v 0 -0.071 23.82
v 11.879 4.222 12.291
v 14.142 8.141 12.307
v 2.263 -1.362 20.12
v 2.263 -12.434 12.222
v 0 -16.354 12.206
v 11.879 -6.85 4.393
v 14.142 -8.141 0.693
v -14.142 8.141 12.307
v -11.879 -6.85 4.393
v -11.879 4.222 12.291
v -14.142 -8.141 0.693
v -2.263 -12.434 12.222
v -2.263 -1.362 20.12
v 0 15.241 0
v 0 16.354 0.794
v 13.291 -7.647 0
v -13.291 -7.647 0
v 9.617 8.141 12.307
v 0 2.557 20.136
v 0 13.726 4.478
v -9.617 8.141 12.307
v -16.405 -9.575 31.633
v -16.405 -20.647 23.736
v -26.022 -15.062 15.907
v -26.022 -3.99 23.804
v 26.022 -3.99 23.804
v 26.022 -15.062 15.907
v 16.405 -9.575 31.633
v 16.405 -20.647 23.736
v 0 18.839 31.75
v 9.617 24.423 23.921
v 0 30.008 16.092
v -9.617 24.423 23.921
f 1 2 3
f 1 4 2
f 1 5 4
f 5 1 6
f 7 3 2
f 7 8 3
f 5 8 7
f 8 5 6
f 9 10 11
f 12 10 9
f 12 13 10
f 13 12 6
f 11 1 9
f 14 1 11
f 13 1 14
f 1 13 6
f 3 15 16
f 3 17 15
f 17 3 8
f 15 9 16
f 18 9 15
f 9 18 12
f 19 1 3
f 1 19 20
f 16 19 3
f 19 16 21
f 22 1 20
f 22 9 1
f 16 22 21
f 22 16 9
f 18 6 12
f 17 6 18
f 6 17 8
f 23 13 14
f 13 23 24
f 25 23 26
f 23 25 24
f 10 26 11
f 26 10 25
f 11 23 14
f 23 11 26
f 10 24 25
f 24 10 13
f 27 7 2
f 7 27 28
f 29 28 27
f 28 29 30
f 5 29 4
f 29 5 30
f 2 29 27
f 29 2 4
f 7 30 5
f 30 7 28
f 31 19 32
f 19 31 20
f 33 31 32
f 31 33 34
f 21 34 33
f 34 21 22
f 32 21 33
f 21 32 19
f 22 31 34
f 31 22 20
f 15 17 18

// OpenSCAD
corner();

module corner() difference(){
    translate([0,0,6.5]) rotate([35.5,0,0]) union(){
        rotate([0,-45,0]) translate([-10,-10,-10]){
            cube([20,20,20]);
            translate([3.2,3.2,0]) cube([13.6,13.6,40]);
        }
        rotate([0,45,0]) translate([-10,-10,-10]){
            cube([20,20,20]);
            translate([3.2,3.2,0]) cube([13.6,13.6,40]);
        }
        rotate([0,-45,0]) rotate([-90,0,0]) translate([-10,-10,-10]){
            cube([20,20,20]);
            translate([3.2,3.2,0]) cube([13.6,13.6,40]);
        }
    }
    mirror([0,0,1]) cylinder(r=30,h=30);
}
